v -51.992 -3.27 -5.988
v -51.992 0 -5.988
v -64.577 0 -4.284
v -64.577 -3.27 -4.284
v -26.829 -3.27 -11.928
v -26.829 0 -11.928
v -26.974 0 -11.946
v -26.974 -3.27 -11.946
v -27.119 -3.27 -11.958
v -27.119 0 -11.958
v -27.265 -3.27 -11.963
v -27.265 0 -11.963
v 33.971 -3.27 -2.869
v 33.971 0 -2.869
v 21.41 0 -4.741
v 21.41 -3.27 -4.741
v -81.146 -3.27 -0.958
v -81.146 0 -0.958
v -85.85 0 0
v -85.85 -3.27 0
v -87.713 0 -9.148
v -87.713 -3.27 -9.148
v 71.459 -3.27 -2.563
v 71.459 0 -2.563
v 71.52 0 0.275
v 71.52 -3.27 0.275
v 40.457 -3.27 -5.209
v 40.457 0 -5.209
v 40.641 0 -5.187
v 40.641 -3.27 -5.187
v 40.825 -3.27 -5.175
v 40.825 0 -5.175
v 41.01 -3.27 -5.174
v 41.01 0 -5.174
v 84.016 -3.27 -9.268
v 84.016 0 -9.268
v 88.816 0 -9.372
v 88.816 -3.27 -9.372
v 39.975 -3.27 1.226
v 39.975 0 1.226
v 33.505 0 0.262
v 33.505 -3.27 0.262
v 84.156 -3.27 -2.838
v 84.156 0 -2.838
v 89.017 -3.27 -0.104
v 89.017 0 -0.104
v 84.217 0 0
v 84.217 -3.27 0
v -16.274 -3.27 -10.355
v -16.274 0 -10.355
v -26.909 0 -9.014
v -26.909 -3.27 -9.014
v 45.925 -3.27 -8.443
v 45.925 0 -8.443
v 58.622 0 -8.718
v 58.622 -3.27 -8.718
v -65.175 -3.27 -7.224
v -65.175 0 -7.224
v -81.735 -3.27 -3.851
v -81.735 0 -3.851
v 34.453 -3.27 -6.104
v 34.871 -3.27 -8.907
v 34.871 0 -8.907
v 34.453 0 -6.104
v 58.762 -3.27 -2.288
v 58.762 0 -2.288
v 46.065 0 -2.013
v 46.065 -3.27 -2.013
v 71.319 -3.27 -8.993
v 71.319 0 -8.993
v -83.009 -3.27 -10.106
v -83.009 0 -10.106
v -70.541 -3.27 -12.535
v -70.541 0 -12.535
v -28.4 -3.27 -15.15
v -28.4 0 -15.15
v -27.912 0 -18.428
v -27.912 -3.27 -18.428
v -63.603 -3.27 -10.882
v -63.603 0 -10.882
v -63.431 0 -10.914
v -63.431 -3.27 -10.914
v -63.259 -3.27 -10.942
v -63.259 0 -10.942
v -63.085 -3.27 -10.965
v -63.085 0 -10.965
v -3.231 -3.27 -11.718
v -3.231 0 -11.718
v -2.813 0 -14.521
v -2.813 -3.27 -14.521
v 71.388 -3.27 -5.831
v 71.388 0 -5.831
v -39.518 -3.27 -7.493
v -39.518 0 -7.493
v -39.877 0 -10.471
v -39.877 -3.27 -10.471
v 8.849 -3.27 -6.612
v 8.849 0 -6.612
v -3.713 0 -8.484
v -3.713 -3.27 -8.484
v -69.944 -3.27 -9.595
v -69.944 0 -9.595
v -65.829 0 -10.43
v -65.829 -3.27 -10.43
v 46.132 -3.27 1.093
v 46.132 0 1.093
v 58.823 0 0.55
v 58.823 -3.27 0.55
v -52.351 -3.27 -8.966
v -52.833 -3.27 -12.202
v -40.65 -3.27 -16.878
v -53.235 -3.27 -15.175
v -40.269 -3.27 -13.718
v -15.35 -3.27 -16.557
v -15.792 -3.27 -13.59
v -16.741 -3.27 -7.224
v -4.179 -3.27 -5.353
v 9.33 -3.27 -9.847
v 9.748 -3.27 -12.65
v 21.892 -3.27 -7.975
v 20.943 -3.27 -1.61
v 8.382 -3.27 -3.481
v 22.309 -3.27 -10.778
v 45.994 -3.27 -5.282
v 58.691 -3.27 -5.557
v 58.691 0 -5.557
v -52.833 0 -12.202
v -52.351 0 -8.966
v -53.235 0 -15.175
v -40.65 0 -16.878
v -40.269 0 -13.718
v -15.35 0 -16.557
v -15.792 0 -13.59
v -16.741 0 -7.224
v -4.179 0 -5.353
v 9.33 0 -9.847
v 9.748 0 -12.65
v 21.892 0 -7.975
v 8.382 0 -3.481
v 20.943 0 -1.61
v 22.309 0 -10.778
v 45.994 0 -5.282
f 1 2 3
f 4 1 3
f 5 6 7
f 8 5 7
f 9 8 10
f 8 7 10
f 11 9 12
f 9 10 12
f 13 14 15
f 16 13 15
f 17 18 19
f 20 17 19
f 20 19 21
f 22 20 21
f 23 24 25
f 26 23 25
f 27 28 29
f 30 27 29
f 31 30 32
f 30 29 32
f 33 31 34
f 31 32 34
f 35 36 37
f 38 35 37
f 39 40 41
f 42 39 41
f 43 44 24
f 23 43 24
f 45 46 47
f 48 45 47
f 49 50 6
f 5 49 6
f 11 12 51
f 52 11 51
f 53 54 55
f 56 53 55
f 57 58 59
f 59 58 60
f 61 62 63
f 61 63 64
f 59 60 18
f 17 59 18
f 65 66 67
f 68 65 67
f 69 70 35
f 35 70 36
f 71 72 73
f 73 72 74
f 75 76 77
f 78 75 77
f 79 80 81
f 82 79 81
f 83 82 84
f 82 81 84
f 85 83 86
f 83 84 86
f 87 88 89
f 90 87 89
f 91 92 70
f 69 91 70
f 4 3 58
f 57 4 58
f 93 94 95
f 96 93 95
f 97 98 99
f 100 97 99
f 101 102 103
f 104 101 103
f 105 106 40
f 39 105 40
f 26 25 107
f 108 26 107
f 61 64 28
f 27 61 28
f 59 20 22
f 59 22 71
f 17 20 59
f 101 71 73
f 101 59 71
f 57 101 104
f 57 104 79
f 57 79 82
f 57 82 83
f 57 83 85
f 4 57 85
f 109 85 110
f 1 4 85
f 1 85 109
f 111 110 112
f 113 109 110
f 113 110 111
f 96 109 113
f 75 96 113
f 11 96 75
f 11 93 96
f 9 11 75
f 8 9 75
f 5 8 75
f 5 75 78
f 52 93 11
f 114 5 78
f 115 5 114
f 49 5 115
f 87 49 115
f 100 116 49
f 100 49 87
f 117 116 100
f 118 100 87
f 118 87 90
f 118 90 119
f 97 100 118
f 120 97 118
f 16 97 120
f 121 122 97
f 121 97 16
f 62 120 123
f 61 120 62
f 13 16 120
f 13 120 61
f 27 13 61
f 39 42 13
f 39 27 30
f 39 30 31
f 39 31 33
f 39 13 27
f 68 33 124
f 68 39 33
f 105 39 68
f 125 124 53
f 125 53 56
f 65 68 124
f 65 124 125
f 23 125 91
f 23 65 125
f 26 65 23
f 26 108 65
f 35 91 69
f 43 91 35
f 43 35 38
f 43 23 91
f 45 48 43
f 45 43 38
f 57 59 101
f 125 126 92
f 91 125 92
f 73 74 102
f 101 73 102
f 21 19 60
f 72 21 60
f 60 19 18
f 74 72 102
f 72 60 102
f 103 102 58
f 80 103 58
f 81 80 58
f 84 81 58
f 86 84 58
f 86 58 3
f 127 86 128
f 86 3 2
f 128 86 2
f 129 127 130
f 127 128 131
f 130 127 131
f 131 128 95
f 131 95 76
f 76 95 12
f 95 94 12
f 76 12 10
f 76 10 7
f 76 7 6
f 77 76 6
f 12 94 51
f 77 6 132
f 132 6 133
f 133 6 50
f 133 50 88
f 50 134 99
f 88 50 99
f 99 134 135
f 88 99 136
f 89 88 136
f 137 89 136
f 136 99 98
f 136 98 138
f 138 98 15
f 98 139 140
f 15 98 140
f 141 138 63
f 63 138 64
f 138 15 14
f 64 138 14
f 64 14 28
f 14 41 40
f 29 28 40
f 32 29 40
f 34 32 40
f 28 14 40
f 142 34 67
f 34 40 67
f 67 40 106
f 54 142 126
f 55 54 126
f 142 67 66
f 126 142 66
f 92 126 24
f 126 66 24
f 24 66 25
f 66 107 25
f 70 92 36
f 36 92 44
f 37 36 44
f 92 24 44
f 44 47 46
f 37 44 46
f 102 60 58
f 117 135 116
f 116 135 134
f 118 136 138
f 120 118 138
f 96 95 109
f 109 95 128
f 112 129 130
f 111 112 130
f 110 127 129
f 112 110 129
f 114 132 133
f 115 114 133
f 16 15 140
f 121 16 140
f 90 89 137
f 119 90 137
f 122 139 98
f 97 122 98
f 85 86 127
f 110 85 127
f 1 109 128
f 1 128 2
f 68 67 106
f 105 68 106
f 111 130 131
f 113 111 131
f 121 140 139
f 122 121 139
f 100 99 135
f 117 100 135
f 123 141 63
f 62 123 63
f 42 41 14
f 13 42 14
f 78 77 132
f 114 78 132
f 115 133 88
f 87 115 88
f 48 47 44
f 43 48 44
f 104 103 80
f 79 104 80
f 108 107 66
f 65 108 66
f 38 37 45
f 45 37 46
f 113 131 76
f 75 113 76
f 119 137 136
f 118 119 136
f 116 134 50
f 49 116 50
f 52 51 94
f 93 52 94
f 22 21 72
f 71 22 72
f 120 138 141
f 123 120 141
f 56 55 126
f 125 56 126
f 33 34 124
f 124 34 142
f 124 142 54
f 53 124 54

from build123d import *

# Parameters (mm, degrees)
F1_DEPTH = 3.27


with BuildPart() as f1:
    # F0 (on Front) → F1 (new body)
    with BuildSketch(Plane.XZ):
        Polygon((88.0849202076, -6.1928071498), (88.0849202076, -2.9228071498), (84.155737444, -2.8377134103), (84.0849513189, -6.1062455567), align=None)
        Polygon((84.155737444, -2.8377134103), (88.0849202076, -2.9228071498), (88.0849202076, -6.1928071498), (84.0849513189, -6.1062455567), (84.0164814126, -9.2678268597), (88.8164814126, -9.3717797613), (89.0171933904, -0.1039529016), (84.2171933904, 0), align=None)
        Polygon((84.0849513189, -6.1062455567), (84.155737444, -2.8377134103), (71.4586099838, -2.5627335684), (71.387872598, -5.8314735793), align=None)
        Polygon((71.387872598, -5.8314735793), (71.4586099838, -2.5627335684), (58.7615872094, -2.2877559936), (58.6908453502, -5.5567027157), align=None)
        Polygon((58.7615872094, -2.2877559936), (71.4586099838, -2.5627335684), (71.5200152581, 0.27477413), (58.8229924837, 0.5497517048), align=None)
        Polygon((84.0164814126, -9.2678268597), (84.0849513189, -6.1062455567), (71.387872598, -5.8314735793), (71.3194541632, -8.9930559962), align=None)
        Polygon((58.6908453502, -5.5567027157), (58.7615872094, -2.2877559936), (46.0645644334, -2.0127784187), (45.9938181008, -5.2819318522), align=None)
        with BuildLine():
            Line((45.9938181008, -5.2819318522), (46.0645644334, -2.0127784187))
            Line((46.0645644334, -2.0127784187), (41.0805670131, -1.9048407118))
            ThreePointArc((41.0805670131, -1.9048407118), (40.5264072315, -1.9163330219), (39.9752108165, -1.9747080916))
            Line((39.9752108165, -1.9747080916), (33.9712176037, -2.8692401974))
            Line((33.9712176037, -2.8692401974), (34.4530943895, -6.1035399305))
            Line((34.4530943895, -6.1035399305), (40.4570876022, -5.2090078247))
            ThreePointArc((40.4570876022, -5.2090078247), (40.7326592445, -5.1798219691), (41.0097124764, -5.1740729826))
            Line((41.0097124764, -5.1740729826), (45.9938181008, -5.2819318522))
        make_face()
        with BuildLine():
            Line((41.0805670131, -1.9048407118), (46.0645644334, -2.0127784187))
            Line((46.0645644334, -2.0127784187), (46.1317693836, 1.0927294697))
            Line((46.1317693836, 1.0927294697), (39.9752108165, 1.2259608853))
            Line((39.9752108165, 1.2259608853), (33.5047069945, 0.2619235848))
            Line((33.5047069945, 0.2619235848), (33.9712176037, -2.8692401974))
            Line((33.9712176037, -2.8692401974), (39.9752108165, -1.9747080916))
            ThreePointArc((39.9752108165, -1.9747080916), (40.5264072315, -1.9163330219), (41.0805670131, -1.9048407118))
        make_face()
        Polygon((58.6224313888, -8.7180784214), (58.6908453502, -5.5567027157), (45.9938181008, -5.2819318522), (45.9254041394, -8.4433075578), align=None)
        Polygon((34.4530943895, -6.1035399305), (33.9712176037, -2.8692401974), (21.4098700166, -4.7407494263), (21.8917468023, -7.9750491594), align=None)
        Polygon((21.8917468023, -7.9750491594), (21.4098700166, -4.7407494263), (8.8485224294, -6.6122586553), (9.3303992151, -9.8465583884), align=None)
        Polygon((8.8485224294, -6.6122586553), (21.4098700166, -4.7407494263), (20.9433594073, -1.6095856442), (8.3820118202, -3.4810948731), align=None)
        Polygon((34.8707613687, -8.9068710714), (34.4530943895, -6.1035399305), (21.8917468023, -7.9750491594), (22.3094137815, -10.7783803003), align=None)
        Polygon((9.3303992151, -9.8465583884), (8.8485224294, -6.6122586553), (-3.7128251578, -8.4837678842), (-3.2309483721, -11.7180676173), align=None)
        Polygon((-3.2309483721, -11.7180676173), (-3.7128251578, -8.4837678842), (-16.274172745, -10.3552771132), (-15.7922959593, -13.5895768463), align=None)
        Polygon((-16.274172745, -10.3552771132), (-3.7128251578, -8.4837678842), (-4.179335767, -5.3526041021), (-16.7406833542, -7.224113331), align=None)
        Polygon((9.7480661944, -12.6498895293), (9.3303992151, -9.8465583884), (-3.2309483721, -11.7180676173), (-2.8132813928, -14.5213987582), align=None)
        with BuildLine():
            Line((-15.7922959593, -13.5895768463), (-16.274172745, -10.3552771132))
            Line((-16.274172745, -10.3552771132), (-26.8291325696, -11.9278555795))
            ThreePointArc((-26.8291325696, -11.9278555795), (-27.0463868948, -11.9528310654), (-27.2648247248, -11.9632296803))
            Line((-27.2648247248, -11.9632296803), (-27.3333623041, -12.5313407106))
            Line((-27.3333623041, -12.5313407106), (-27.6582478154, -15.224331103))
            ThreePointArc((-27.6582478154, -15.224331103), (-27.0011881523, -15.2262131022), (-26.3472557839, -15.1621553125))
            Line((-26.3472557839, -15.1621553125), (-15.7922959593, -13.5895768463))
        make_face()
        with BuildLine():
            Line((-15.350207165, -16.5568243078), (-15.7922959593, -13.5895768463))
            Line((-15.7922959593, -13.5895768463), (-26.3472557839, -15.1621553125))
            ThreePointArc((-26.3472557839, -15.1621553125), (-27.0011881523, -15.2262131022), (-27.6582478154, -15.224331103))
            ThreePointArc((-27.6582478154, -15.224331103), (-27.8766021467, -15.2090531255), (-28.0943229104, -15.186476597))
            Line((-28.0943229104, -15.186476597), (-28.4000527535, -15.1495929911))
            Line((-28.4000527535, -15.1495929911), (-27.9115547522, -18.4283335368))
            Line((-27.9115547522, -18.4283335368), (-15.350207165, -16.5568243078))
        make_face()
        with BuildLine():
            Line((-27.3333623041, -12.5313407106), (-27.2648247248, -11.9632296803))
            ThreePointArc((-27.2648247248, -11.9632296803), (-27.4841349376, -11.9589696843), (-27.7026661329, -11.9400162217))
            Line((-27.7026661329, -11.9400162217), (-39.8769224488, -10.4712996977))
            Line((-39.8769224488, -10.4712996977), (-40.2685792263, -13.717760073))
            Line((-40.2685792263, -13.717760073), (-28.4000527535, -15.1495929911))
            Line((-28.4000527535, -15.1495929911), (-28.0943229104, -15.186476597))
            ThreePointArc((-28.0943229104, -15.186476597), (-27.8766021467, -15.2090531255), (-27.6582478154, -15.224331103))
            Line((-27.6582478154, -15.224331103), (-27.3333623041, -12.5313407106))
        make_face()
        with BuildLine():
            ThreePointArc((-27.7026661329, -11.9400162217), (-27.4841349376, -11.9589696843), (-27.2648247248, -11.9632296803))
            Line((-27.2648247248, -11.9632296803), (-26.9090273113, -9.0140091622))
            Line((-26.9090273113, -9.0140091622), (-39.5176043042, -7.4928956836))
            Line((-39.5176043042, -7.4928956836), (-39.8769224488, -10.4712996977))
            Line((-39.8769224488, -10.4712996977), (-27.7026661329, -11.9400162217))
        make_face()
        Polygon((-40.2685792263, -13.717760073), (-39.8769224488, -10.4712996977), (-52.3508780033, -8.9664271069), (-52.3940183108, -8.9612226097), (-52.8326980236, -12.2020100831), align=None)
        Polygon((-52.3940183108, -8.9612226097), (-52.3508780033, -8.9664271069), (-51.9915598587, -5.9880230928), align=None)
        Polygon((-40.6498897454, -16.8784598537), (-40.2685792263, -13.717760073), (-52.8326980236, -12.2020100831), (-53.2351142651, -15.1748977649), align=None)
        with BuildLine():
            Line((-52.8326980236, -12.2020100831), (-52.3940183108, -8.9612226097))
            Line((-52.3940183108, -8.9612226097), (-62.6937612549, -7.7186495717))
            ThreePointArc((-62.6937612549, -7.7186495717), (-62.824652475, -7.7001674476), (-62.9546897587, -7.6764102329))
            Line((-62.9546897587, -7.6764102329), (-65.1754864714, -7.224113331))
            Line((-65.1754864714, -7.224113331), (-65.8285059402, -10.4298488094))
            Line((-65.8285059402, -10.4298488094), (-63.6028382914, -10.8815332771))
            ThreePointArc((-63.6028382914, -10.8815332771), (-63.3449657453, -10.9285070615), (-63.0854180325, -10.9651099471))
            Line((-63.0854180325, -10.9651099471), (-52.8326980236, -12.2020100831))
        make_face()
        with BuildLine():
            Line((-62.6937612549, -7.7186495717), (-52.3940183108, -8.9612226097))
            Line((-52.3940183108, -8.9612226097), (-51.9915598587, -5.9880230928))
            Line((-51.9915598587, -5.9880230928), (-64.5767843783, -4.284461004))
            Line((-64.5767843783, -4.284461004), (-65.1754864714, -7.224113331))
            Line((-65.1754864714, -7.224113331), (-62.9546897587, -7.6764102329))
            ThreePointArc((-62.9546897587, -7.6764102329), (-62.824652475, -7.7001674476), (-62.6937612549, -7.7186495717))
        make_face()
        Polygon((-65.8285059402, -10.4298488094), (-65.1754864714, -7.224113331), (-81.7354778523, -3.8514350694), (-82.3907114007, -7.0686592077), (-69.9444316109, -9.5945490301), align=None)
        Polygon((-86.2950797924, -2.9228071498), (-81.7354778523, -3.8514350694), (-81.1461729514, -0.9579233488), (-85.8496166746, 0), (-87.7128069895, -9.1483424039), (-83.0093632663, -10.1062657528), (-82.3907114007, -7.0686592077), (-86.2950797924, -6.2762935732), align=None)
        Polygon((-82.3907114007, -7.0686592077), (-81.7354778523, -3.8514350694), (-86.2950797924, -2.9228071498), (-86.2950797924, -6.2762935732), align=None)
        Polygon((-69.9444316109, -9.5945490301), (-82.3907114007, -7.0686592077), (-83.0093632663, -10.1062657528), (-70.5410984981, -12.5346151222), align=None)
    extrude(amount=F1_DEPTH)


solid = f1.part
